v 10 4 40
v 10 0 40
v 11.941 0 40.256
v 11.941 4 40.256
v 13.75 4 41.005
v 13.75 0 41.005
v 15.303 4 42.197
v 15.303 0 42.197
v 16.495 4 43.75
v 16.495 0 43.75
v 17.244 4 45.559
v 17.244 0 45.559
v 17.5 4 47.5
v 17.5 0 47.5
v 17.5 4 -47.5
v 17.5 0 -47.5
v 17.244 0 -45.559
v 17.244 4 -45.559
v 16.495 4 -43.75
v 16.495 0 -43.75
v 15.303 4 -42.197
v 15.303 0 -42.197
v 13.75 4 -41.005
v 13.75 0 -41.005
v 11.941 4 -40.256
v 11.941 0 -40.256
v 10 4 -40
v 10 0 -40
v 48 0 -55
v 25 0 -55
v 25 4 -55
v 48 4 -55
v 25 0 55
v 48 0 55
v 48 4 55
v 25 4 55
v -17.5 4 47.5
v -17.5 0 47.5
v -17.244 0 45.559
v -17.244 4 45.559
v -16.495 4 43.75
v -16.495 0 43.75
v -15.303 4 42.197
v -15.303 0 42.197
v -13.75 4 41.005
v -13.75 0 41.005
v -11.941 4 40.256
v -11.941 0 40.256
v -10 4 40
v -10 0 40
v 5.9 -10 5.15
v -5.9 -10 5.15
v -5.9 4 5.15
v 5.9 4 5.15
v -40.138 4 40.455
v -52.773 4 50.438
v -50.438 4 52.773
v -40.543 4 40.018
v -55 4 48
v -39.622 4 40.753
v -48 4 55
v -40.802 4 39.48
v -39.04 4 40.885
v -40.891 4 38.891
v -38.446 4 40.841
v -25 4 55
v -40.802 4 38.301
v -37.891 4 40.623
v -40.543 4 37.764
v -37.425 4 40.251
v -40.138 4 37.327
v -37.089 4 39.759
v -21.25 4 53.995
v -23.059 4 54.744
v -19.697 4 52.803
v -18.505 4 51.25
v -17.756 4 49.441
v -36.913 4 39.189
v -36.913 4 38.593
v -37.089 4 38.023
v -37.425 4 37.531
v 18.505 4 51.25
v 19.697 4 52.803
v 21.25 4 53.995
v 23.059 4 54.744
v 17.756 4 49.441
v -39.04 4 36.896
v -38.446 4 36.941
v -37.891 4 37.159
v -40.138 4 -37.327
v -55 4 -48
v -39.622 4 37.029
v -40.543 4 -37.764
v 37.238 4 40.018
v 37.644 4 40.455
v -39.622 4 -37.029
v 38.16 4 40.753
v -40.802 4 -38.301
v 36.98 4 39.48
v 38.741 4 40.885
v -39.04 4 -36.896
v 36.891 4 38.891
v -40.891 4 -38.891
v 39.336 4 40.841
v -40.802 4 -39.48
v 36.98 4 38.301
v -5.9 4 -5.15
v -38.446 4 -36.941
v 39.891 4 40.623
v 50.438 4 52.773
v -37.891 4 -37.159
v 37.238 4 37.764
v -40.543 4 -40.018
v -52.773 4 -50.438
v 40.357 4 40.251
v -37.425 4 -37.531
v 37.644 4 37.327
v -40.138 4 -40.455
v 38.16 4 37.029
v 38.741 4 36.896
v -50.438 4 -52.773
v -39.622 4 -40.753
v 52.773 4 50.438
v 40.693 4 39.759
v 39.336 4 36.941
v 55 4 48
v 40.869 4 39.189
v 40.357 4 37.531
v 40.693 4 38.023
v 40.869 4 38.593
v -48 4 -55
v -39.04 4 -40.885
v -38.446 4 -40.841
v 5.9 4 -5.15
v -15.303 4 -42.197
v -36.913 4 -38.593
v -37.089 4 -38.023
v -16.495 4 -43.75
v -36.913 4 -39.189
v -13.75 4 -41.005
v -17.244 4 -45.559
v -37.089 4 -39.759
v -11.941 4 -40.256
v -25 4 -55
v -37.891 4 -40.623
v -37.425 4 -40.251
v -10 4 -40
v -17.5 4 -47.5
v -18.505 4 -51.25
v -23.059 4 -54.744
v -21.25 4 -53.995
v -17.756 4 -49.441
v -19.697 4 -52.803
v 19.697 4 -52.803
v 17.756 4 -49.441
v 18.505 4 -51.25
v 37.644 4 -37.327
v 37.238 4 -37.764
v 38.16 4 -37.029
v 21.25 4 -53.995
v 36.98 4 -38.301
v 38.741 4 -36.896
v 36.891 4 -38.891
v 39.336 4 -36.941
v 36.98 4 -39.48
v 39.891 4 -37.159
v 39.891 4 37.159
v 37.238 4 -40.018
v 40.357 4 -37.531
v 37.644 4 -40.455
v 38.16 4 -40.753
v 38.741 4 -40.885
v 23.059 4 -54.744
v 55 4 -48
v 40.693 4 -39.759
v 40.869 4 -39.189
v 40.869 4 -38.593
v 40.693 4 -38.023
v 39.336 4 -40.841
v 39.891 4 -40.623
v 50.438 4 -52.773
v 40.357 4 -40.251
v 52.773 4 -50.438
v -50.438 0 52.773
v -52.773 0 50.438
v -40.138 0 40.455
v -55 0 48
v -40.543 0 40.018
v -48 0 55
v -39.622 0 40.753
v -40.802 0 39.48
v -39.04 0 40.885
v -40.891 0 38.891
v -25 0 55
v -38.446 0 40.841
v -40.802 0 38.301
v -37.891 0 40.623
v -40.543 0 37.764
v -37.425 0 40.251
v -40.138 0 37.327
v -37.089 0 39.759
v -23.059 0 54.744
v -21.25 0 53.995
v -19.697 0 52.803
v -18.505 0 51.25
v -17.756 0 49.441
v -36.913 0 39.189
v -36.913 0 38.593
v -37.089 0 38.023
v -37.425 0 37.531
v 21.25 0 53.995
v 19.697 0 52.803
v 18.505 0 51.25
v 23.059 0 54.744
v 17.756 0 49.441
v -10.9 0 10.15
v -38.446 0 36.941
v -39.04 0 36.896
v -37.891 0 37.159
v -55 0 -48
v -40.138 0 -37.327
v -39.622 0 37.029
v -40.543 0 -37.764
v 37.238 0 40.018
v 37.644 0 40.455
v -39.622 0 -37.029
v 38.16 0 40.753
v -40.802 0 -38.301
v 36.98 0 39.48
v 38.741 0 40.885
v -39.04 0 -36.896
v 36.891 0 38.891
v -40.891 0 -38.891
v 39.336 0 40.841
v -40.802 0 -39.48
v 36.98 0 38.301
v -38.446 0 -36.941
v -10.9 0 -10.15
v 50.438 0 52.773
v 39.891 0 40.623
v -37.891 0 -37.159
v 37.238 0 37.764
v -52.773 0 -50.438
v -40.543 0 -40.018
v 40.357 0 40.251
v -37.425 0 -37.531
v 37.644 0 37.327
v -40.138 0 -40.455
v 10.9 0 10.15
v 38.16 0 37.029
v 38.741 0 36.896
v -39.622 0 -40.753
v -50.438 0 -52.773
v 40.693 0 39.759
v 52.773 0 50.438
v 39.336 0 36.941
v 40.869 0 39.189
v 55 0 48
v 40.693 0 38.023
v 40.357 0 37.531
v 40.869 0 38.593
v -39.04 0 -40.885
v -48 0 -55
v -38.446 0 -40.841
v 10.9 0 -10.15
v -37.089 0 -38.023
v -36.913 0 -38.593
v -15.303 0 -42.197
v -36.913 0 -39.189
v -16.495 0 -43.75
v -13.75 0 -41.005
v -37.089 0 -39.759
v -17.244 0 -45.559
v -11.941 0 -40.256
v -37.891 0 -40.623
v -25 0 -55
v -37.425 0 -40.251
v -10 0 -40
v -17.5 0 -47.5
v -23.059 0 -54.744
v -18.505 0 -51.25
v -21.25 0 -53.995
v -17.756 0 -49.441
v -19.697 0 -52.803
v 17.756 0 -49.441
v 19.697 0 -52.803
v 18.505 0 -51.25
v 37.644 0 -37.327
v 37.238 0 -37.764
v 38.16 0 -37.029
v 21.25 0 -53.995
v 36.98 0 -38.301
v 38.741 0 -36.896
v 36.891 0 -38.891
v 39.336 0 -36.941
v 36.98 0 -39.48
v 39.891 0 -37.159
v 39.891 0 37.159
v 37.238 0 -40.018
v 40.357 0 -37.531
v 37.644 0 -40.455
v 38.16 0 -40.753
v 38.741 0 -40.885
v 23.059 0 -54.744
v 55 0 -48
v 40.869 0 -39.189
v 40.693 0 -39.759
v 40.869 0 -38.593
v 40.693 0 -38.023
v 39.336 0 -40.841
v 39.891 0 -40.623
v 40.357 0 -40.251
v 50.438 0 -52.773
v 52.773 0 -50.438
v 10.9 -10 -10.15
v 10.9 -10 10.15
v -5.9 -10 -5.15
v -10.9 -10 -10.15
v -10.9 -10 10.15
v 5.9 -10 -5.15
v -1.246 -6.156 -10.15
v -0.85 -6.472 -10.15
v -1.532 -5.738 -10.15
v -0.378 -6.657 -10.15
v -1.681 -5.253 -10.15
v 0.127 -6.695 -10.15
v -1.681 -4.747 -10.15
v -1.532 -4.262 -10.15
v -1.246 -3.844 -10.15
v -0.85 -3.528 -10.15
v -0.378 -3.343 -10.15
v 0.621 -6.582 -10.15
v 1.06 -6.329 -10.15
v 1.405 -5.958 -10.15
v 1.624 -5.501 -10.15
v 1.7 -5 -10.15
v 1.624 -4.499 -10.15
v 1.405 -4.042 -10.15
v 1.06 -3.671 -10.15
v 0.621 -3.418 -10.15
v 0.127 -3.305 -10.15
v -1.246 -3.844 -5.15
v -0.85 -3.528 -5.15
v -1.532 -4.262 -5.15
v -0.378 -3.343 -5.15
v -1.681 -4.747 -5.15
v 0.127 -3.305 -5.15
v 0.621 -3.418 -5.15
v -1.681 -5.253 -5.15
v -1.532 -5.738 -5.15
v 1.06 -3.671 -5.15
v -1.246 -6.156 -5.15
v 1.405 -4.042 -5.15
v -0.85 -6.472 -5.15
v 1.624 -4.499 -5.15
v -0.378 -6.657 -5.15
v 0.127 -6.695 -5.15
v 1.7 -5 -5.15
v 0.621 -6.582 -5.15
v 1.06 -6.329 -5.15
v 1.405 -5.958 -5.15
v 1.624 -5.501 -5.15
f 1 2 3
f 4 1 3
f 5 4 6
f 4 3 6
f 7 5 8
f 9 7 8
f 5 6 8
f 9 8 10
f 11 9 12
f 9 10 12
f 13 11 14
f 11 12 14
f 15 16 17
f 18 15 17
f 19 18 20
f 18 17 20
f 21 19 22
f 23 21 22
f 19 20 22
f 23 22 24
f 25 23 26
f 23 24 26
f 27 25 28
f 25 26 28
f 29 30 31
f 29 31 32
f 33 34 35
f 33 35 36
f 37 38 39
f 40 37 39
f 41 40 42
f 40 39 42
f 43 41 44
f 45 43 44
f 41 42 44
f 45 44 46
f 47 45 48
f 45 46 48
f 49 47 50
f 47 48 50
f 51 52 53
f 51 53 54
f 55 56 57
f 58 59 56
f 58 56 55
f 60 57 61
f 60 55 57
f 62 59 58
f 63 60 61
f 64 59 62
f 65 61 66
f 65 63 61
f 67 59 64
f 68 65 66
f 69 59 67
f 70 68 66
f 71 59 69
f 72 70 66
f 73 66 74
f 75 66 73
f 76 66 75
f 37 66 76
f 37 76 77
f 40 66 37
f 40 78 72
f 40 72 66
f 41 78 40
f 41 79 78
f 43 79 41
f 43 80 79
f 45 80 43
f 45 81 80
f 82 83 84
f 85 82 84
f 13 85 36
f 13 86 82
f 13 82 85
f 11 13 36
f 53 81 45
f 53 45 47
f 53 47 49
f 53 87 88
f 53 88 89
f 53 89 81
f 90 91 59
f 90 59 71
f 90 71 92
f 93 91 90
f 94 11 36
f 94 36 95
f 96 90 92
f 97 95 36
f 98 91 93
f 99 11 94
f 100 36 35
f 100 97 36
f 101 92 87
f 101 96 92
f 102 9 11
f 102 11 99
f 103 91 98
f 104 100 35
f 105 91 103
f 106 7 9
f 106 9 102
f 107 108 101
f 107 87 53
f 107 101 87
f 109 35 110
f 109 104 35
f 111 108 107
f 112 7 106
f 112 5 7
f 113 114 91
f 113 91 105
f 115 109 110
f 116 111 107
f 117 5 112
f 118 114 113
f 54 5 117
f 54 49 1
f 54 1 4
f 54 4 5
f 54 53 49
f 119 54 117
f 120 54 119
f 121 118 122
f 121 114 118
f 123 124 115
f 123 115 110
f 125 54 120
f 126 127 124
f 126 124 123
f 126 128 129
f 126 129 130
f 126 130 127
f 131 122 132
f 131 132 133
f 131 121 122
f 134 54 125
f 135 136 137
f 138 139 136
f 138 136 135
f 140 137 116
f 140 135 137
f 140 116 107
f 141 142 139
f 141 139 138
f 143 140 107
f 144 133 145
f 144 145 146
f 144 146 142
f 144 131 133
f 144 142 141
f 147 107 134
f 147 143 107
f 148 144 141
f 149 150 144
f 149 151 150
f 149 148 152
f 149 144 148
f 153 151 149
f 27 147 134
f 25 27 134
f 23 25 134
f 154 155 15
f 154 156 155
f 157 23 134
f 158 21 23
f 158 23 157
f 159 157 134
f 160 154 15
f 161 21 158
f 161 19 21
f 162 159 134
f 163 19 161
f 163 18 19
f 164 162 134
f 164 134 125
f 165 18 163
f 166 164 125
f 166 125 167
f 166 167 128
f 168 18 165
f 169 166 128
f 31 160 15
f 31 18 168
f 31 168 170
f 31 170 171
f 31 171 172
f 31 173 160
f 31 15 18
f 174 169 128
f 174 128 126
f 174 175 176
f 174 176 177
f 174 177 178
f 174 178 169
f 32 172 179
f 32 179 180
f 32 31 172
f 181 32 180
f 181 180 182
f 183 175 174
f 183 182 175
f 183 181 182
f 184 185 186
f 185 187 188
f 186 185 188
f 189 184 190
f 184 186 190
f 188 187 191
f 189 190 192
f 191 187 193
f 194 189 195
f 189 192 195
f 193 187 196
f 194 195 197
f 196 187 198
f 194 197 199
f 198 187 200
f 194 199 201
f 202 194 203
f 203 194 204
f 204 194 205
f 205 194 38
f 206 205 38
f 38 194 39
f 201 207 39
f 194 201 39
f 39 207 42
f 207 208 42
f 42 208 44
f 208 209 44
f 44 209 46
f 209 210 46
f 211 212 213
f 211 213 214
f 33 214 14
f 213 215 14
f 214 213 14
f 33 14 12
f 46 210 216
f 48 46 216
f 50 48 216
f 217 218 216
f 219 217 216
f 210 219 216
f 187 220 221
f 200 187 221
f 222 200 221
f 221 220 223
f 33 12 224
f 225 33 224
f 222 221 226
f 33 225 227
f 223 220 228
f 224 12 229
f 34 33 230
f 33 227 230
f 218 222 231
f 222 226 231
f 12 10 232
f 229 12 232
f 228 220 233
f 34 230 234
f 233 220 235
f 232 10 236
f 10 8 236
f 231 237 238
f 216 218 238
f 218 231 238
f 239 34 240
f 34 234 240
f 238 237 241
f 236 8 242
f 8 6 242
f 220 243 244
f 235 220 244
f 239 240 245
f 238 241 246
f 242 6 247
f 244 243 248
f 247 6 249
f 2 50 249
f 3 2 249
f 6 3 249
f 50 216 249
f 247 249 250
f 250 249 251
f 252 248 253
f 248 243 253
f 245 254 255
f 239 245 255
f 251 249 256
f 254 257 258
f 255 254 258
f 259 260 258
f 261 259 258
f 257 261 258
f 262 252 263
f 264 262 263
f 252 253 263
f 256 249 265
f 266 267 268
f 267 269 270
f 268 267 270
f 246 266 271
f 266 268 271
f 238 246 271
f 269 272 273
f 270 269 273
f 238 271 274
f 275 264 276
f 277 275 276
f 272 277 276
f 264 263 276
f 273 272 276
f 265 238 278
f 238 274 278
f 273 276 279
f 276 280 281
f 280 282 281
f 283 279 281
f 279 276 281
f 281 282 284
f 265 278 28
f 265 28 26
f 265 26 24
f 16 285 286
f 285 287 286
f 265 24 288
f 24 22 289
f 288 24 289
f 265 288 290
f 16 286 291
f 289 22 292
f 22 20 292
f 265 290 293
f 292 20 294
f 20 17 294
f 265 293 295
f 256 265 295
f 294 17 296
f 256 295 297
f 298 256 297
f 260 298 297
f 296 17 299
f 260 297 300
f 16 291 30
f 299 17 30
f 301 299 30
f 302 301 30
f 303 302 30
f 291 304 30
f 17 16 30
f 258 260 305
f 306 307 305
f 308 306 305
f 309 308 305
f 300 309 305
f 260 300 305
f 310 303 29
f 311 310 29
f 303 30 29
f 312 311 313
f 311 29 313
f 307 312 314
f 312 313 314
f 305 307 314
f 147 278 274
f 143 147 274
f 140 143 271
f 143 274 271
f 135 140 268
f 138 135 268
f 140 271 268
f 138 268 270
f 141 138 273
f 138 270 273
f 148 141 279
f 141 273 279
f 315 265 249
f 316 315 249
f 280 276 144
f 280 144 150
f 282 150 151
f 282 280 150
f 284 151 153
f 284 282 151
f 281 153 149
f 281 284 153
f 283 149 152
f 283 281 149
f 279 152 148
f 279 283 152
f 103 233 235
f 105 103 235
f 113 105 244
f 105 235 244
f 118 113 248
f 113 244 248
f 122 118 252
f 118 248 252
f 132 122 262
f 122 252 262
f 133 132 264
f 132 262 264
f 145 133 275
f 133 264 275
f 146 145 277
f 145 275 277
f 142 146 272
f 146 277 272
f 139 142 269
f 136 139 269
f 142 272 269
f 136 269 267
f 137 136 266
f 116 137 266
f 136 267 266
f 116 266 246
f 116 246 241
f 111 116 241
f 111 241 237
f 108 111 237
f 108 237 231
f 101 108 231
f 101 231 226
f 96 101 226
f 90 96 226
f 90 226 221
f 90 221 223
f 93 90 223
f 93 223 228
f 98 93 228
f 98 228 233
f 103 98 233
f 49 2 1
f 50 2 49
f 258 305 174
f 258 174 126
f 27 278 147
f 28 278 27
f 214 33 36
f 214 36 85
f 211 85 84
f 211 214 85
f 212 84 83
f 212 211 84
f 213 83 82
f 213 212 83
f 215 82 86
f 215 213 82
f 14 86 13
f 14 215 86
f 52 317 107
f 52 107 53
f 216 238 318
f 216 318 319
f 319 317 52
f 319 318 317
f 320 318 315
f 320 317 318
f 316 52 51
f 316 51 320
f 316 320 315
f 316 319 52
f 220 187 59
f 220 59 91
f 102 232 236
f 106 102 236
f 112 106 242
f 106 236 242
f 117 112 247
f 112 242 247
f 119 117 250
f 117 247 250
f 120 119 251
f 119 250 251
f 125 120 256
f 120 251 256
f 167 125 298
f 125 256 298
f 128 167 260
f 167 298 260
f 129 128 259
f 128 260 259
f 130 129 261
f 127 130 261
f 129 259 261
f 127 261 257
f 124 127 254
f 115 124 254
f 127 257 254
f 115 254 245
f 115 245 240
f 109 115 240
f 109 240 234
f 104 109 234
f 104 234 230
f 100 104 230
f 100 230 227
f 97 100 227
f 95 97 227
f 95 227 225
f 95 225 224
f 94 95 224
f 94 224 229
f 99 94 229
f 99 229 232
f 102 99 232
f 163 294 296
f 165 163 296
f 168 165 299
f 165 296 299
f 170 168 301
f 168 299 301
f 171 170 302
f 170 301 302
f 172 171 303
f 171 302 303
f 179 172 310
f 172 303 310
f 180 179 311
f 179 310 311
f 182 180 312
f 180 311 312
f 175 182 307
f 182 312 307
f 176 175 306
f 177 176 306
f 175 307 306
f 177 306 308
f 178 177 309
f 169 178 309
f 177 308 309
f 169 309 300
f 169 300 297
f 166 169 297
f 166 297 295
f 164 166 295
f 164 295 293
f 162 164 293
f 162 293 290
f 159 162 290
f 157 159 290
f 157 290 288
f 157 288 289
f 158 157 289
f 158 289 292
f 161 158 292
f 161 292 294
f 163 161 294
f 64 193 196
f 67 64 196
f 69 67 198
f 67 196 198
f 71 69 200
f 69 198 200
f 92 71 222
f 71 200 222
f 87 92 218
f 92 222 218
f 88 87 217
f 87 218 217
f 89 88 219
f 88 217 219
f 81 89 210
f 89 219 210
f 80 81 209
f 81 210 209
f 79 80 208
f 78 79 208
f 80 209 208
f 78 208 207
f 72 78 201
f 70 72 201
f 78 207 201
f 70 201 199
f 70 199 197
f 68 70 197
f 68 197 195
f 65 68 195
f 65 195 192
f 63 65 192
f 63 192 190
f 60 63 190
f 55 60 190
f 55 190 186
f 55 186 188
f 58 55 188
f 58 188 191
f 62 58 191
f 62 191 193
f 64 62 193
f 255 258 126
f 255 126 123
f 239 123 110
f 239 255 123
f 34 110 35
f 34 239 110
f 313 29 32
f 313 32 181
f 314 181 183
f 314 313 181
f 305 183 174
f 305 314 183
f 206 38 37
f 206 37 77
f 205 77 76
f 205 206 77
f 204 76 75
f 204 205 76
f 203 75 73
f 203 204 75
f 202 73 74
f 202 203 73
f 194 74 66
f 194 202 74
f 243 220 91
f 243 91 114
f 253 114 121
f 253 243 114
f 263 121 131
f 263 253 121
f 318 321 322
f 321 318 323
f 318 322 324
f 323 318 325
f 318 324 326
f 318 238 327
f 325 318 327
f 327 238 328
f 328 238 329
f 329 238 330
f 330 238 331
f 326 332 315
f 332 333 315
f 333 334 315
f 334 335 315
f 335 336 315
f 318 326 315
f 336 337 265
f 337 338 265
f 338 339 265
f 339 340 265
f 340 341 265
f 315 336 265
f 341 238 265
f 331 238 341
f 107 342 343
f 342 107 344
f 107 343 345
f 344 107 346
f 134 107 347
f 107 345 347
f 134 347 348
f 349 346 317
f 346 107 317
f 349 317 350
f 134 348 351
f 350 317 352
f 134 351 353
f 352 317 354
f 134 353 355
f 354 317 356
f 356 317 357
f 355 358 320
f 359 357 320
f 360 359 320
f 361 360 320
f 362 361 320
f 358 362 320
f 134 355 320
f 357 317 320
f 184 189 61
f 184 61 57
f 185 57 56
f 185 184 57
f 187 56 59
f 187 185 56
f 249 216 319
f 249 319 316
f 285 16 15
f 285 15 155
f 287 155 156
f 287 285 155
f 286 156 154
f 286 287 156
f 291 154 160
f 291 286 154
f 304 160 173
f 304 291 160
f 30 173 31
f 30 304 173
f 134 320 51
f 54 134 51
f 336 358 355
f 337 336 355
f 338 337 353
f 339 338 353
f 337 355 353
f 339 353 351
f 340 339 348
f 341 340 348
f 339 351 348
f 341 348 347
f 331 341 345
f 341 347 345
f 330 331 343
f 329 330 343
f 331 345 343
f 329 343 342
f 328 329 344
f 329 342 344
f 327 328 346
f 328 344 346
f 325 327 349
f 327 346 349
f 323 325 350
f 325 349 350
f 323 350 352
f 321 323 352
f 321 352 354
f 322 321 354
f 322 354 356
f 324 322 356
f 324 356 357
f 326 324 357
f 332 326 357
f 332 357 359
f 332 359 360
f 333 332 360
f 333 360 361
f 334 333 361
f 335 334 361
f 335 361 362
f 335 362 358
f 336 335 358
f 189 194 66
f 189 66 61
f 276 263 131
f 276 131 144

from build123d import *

# Parameters (mm, degrees)
BOSS_EXTRUDE1_DEPTH      = 4
F_4_0MM_DOWEL_HOLE2_D    = 4
FILLET1_START            = -1
FILLET1_DEPTH            = 6
FILLET1_2_DEPTH          = 4
SKETCH7_W                = 21.8
SKETCH7_H                = 20.3
SKETCH7_W_2              = 11.8
SKETCH7_H_2              = 10.3
BOSS_EXTRUDE2_DEPTH      = 10
M3_CLEARANCE_HOLE1_D     = 3.4
M3_CLEARANCE_HOLE1_DEPTH = 5
SKETCH7_2_W              = 11.8
SKETCH7_2_H              = 10.3
CUT_EXTRUDE1_DEPTH       = 10


with BuildPart() as part:
    # Sketch1 → Boss-Extrude1 (new body)
    with BuildSketch(Plane(origin=(0, 0, 0), x_dir=(1, 0, 0), z_dir=(0, 1, 0))):
        with BuildLine():
            Line((55, 48), (55, -48))
            ThreePointArc((55, -48), (51.618795027, -51.618795027), (48, -55))
            Line((48, -55), (17.5, -55))
            Line((17.5, -55), (17.5, -40))
            Line((17.5, -40), (-17.5, -40))
            Line((-17.5, -40), (-17.5, -55))
            Line((-17.5, -55), (-48, -55))
            ThreePointArc((-48, -55), (-51.618795027, -51.618795027), (-55, -48))
            Line((-55, -48), (-55, 48))
            ThreePointArc((-55, 48), (-51.618795027, 51.618795027), (-48, 55))
            Line((-48, 55), (-17.5, 55))
            Line((-17.5, 55), (-17.5, 40))
            Line((-17.5, 40), (17.5, 40))
            Line((17.5, 40), (17.5, 55))
            Line((17.5, 55), (48, 55))
            ThreePointArc((48, 55), (51.618795027, 51.618795027), (55, 48))
        make_face()
    extrude(amount=BOSS_EXTRUDE1_DEPTH)

    # Ø4.0mm Dowel Hole2 (through all)
    with Locations(Plane(origin=(0, 4, 0), x_dir=(1, 0, 0), z_dir=(0, 1, 0))):
        with Locations((38.890872965, 38.890872965), (38.890872965, -38.890872965), (-38.890872965, -38.890872965), (-38.890872965, 38.890872965)):
            Hole(F_4_0MM_DOWEL_HOLE2_D / 2)

    # Fillet1: read off the stored shape, not the designer's step
    # Fillet1 outline → Fillet1 (cut)
    with BuildSketch(Plane(origin=(0, 0, 0), x_dir=(1, 0, 0), z_dir=(0, 1, 0)).offset(FILLET1_START)):
        with BuildLine():
            Line((17.5, 55), (17.5, 47.5))
            ThreePointArc((17.5, 47.5), (19.696699141, 52.803300859), (25, 55))
            Line((25, 55), (17.5, 55))
        make_face()
        with BuildLine():
            ThreePointArc((-25, 55), (-19.696699141, 52.803300859), (-17.5, 47.5))
            Line((-17.5, 47.5), (-17.5, 55))
            Line((-17.5, 55), (-25, 55))
        make_face()
        with BuildLine():
            Line((-17.5, -55), (-17.5, -47.5))
            ThreePointArc((-17.5, -47.5), (-19.696699141, -52.803300859), (-25, -55))
            Line((-25, -55), (-17.5, -55))
        make_face()
        with BuildLine():
            ThreePointArc((25, -55), (19.696699141, -52.803300859), (17.5, -47.5))
            Line((17.5, -47.5), (17.5, -55))
            Line((17.5, -55), (25, -55))
        make_face()
    extrude(amount=FILLET1_DEPTH, mode=Mode.SUBTRACT)

    # Fillet1 2 outline → Fillet1 2 (add)
    with BuildSketch(Plane(origin=(0, 0, 0), x_dir=(1, 0, 0), z_dir=(0, 1, 0))):
        with BuildLine():
            Line((-17.5, 40), (-10, 40))
            ThreePointArc((-10, 40), (-15.303300859, 42.196699141), (-17.5, 47.5))
            Line((-17.5, 47.5), (-17.5, 40))
        make_face()
        with BuildLine():
            ThreePointArc((17.5, 47.5), (15.303300859, 42.196699141), (10, 40))
            Line((10, 40), (17.5, 40))
            Line((17.5, 40), (17.5, 47.5))
        make_face()
        with BuildLine():
            Line((17.5, -40), (10, -40))
            ThreePointArc((10, -40), (15.303300859, -42.196699141), (17.5, -47.5))
            Line((17.5, -47.5), (17.5, -40))
        make_face()
        with BuildLine():
            ThreePointArc((-17.5, -47.5), (-15.303300859, -42.196699141), (-10, -40))
            Line((-10, -40), (-17.5, -40))
            Line((-17.5, -40), (-17.5, -47.5))
        make_face()
    extrude(amount=FILLET1_2_DEPTH)

    # Sketch7 → Boss-Extrude2 (add)
    with BuildSketch(Plane.XZ):
        Rectangle(SKETCH7_W, SKETCH7_H)
        Rectangle(SKETCH7_W_2, SKETCH7_H_2, mode=Mode.SUBTRACT)
    extrude(amount=BOSS_EXTRUDE2_DEPTH)

    # M3 Clearance Hole1
    with Locations(Plane(origin=(0, -5, -10.15), x_dir=(-1, 0, 0), z_dir=(0, 0, -1))):
        with Locations((0, 0)):
            Hole(M3_CLEARANCE_HOLE1_D / 2, depth=M3_CLEARANCE_HOLE1_DEPTH)

    # Sketch7<2> → Cut-Extrude1 (cut)
    with BuildSketch(Plane.XZ):
        Rectangle(SKETCH7_2_W, SKETCH7_2_H)
    extrude(amount=-CUT_EXTRUDE1_DEPTH, mode=Mode.SUBTRACT)


solid = part.part
